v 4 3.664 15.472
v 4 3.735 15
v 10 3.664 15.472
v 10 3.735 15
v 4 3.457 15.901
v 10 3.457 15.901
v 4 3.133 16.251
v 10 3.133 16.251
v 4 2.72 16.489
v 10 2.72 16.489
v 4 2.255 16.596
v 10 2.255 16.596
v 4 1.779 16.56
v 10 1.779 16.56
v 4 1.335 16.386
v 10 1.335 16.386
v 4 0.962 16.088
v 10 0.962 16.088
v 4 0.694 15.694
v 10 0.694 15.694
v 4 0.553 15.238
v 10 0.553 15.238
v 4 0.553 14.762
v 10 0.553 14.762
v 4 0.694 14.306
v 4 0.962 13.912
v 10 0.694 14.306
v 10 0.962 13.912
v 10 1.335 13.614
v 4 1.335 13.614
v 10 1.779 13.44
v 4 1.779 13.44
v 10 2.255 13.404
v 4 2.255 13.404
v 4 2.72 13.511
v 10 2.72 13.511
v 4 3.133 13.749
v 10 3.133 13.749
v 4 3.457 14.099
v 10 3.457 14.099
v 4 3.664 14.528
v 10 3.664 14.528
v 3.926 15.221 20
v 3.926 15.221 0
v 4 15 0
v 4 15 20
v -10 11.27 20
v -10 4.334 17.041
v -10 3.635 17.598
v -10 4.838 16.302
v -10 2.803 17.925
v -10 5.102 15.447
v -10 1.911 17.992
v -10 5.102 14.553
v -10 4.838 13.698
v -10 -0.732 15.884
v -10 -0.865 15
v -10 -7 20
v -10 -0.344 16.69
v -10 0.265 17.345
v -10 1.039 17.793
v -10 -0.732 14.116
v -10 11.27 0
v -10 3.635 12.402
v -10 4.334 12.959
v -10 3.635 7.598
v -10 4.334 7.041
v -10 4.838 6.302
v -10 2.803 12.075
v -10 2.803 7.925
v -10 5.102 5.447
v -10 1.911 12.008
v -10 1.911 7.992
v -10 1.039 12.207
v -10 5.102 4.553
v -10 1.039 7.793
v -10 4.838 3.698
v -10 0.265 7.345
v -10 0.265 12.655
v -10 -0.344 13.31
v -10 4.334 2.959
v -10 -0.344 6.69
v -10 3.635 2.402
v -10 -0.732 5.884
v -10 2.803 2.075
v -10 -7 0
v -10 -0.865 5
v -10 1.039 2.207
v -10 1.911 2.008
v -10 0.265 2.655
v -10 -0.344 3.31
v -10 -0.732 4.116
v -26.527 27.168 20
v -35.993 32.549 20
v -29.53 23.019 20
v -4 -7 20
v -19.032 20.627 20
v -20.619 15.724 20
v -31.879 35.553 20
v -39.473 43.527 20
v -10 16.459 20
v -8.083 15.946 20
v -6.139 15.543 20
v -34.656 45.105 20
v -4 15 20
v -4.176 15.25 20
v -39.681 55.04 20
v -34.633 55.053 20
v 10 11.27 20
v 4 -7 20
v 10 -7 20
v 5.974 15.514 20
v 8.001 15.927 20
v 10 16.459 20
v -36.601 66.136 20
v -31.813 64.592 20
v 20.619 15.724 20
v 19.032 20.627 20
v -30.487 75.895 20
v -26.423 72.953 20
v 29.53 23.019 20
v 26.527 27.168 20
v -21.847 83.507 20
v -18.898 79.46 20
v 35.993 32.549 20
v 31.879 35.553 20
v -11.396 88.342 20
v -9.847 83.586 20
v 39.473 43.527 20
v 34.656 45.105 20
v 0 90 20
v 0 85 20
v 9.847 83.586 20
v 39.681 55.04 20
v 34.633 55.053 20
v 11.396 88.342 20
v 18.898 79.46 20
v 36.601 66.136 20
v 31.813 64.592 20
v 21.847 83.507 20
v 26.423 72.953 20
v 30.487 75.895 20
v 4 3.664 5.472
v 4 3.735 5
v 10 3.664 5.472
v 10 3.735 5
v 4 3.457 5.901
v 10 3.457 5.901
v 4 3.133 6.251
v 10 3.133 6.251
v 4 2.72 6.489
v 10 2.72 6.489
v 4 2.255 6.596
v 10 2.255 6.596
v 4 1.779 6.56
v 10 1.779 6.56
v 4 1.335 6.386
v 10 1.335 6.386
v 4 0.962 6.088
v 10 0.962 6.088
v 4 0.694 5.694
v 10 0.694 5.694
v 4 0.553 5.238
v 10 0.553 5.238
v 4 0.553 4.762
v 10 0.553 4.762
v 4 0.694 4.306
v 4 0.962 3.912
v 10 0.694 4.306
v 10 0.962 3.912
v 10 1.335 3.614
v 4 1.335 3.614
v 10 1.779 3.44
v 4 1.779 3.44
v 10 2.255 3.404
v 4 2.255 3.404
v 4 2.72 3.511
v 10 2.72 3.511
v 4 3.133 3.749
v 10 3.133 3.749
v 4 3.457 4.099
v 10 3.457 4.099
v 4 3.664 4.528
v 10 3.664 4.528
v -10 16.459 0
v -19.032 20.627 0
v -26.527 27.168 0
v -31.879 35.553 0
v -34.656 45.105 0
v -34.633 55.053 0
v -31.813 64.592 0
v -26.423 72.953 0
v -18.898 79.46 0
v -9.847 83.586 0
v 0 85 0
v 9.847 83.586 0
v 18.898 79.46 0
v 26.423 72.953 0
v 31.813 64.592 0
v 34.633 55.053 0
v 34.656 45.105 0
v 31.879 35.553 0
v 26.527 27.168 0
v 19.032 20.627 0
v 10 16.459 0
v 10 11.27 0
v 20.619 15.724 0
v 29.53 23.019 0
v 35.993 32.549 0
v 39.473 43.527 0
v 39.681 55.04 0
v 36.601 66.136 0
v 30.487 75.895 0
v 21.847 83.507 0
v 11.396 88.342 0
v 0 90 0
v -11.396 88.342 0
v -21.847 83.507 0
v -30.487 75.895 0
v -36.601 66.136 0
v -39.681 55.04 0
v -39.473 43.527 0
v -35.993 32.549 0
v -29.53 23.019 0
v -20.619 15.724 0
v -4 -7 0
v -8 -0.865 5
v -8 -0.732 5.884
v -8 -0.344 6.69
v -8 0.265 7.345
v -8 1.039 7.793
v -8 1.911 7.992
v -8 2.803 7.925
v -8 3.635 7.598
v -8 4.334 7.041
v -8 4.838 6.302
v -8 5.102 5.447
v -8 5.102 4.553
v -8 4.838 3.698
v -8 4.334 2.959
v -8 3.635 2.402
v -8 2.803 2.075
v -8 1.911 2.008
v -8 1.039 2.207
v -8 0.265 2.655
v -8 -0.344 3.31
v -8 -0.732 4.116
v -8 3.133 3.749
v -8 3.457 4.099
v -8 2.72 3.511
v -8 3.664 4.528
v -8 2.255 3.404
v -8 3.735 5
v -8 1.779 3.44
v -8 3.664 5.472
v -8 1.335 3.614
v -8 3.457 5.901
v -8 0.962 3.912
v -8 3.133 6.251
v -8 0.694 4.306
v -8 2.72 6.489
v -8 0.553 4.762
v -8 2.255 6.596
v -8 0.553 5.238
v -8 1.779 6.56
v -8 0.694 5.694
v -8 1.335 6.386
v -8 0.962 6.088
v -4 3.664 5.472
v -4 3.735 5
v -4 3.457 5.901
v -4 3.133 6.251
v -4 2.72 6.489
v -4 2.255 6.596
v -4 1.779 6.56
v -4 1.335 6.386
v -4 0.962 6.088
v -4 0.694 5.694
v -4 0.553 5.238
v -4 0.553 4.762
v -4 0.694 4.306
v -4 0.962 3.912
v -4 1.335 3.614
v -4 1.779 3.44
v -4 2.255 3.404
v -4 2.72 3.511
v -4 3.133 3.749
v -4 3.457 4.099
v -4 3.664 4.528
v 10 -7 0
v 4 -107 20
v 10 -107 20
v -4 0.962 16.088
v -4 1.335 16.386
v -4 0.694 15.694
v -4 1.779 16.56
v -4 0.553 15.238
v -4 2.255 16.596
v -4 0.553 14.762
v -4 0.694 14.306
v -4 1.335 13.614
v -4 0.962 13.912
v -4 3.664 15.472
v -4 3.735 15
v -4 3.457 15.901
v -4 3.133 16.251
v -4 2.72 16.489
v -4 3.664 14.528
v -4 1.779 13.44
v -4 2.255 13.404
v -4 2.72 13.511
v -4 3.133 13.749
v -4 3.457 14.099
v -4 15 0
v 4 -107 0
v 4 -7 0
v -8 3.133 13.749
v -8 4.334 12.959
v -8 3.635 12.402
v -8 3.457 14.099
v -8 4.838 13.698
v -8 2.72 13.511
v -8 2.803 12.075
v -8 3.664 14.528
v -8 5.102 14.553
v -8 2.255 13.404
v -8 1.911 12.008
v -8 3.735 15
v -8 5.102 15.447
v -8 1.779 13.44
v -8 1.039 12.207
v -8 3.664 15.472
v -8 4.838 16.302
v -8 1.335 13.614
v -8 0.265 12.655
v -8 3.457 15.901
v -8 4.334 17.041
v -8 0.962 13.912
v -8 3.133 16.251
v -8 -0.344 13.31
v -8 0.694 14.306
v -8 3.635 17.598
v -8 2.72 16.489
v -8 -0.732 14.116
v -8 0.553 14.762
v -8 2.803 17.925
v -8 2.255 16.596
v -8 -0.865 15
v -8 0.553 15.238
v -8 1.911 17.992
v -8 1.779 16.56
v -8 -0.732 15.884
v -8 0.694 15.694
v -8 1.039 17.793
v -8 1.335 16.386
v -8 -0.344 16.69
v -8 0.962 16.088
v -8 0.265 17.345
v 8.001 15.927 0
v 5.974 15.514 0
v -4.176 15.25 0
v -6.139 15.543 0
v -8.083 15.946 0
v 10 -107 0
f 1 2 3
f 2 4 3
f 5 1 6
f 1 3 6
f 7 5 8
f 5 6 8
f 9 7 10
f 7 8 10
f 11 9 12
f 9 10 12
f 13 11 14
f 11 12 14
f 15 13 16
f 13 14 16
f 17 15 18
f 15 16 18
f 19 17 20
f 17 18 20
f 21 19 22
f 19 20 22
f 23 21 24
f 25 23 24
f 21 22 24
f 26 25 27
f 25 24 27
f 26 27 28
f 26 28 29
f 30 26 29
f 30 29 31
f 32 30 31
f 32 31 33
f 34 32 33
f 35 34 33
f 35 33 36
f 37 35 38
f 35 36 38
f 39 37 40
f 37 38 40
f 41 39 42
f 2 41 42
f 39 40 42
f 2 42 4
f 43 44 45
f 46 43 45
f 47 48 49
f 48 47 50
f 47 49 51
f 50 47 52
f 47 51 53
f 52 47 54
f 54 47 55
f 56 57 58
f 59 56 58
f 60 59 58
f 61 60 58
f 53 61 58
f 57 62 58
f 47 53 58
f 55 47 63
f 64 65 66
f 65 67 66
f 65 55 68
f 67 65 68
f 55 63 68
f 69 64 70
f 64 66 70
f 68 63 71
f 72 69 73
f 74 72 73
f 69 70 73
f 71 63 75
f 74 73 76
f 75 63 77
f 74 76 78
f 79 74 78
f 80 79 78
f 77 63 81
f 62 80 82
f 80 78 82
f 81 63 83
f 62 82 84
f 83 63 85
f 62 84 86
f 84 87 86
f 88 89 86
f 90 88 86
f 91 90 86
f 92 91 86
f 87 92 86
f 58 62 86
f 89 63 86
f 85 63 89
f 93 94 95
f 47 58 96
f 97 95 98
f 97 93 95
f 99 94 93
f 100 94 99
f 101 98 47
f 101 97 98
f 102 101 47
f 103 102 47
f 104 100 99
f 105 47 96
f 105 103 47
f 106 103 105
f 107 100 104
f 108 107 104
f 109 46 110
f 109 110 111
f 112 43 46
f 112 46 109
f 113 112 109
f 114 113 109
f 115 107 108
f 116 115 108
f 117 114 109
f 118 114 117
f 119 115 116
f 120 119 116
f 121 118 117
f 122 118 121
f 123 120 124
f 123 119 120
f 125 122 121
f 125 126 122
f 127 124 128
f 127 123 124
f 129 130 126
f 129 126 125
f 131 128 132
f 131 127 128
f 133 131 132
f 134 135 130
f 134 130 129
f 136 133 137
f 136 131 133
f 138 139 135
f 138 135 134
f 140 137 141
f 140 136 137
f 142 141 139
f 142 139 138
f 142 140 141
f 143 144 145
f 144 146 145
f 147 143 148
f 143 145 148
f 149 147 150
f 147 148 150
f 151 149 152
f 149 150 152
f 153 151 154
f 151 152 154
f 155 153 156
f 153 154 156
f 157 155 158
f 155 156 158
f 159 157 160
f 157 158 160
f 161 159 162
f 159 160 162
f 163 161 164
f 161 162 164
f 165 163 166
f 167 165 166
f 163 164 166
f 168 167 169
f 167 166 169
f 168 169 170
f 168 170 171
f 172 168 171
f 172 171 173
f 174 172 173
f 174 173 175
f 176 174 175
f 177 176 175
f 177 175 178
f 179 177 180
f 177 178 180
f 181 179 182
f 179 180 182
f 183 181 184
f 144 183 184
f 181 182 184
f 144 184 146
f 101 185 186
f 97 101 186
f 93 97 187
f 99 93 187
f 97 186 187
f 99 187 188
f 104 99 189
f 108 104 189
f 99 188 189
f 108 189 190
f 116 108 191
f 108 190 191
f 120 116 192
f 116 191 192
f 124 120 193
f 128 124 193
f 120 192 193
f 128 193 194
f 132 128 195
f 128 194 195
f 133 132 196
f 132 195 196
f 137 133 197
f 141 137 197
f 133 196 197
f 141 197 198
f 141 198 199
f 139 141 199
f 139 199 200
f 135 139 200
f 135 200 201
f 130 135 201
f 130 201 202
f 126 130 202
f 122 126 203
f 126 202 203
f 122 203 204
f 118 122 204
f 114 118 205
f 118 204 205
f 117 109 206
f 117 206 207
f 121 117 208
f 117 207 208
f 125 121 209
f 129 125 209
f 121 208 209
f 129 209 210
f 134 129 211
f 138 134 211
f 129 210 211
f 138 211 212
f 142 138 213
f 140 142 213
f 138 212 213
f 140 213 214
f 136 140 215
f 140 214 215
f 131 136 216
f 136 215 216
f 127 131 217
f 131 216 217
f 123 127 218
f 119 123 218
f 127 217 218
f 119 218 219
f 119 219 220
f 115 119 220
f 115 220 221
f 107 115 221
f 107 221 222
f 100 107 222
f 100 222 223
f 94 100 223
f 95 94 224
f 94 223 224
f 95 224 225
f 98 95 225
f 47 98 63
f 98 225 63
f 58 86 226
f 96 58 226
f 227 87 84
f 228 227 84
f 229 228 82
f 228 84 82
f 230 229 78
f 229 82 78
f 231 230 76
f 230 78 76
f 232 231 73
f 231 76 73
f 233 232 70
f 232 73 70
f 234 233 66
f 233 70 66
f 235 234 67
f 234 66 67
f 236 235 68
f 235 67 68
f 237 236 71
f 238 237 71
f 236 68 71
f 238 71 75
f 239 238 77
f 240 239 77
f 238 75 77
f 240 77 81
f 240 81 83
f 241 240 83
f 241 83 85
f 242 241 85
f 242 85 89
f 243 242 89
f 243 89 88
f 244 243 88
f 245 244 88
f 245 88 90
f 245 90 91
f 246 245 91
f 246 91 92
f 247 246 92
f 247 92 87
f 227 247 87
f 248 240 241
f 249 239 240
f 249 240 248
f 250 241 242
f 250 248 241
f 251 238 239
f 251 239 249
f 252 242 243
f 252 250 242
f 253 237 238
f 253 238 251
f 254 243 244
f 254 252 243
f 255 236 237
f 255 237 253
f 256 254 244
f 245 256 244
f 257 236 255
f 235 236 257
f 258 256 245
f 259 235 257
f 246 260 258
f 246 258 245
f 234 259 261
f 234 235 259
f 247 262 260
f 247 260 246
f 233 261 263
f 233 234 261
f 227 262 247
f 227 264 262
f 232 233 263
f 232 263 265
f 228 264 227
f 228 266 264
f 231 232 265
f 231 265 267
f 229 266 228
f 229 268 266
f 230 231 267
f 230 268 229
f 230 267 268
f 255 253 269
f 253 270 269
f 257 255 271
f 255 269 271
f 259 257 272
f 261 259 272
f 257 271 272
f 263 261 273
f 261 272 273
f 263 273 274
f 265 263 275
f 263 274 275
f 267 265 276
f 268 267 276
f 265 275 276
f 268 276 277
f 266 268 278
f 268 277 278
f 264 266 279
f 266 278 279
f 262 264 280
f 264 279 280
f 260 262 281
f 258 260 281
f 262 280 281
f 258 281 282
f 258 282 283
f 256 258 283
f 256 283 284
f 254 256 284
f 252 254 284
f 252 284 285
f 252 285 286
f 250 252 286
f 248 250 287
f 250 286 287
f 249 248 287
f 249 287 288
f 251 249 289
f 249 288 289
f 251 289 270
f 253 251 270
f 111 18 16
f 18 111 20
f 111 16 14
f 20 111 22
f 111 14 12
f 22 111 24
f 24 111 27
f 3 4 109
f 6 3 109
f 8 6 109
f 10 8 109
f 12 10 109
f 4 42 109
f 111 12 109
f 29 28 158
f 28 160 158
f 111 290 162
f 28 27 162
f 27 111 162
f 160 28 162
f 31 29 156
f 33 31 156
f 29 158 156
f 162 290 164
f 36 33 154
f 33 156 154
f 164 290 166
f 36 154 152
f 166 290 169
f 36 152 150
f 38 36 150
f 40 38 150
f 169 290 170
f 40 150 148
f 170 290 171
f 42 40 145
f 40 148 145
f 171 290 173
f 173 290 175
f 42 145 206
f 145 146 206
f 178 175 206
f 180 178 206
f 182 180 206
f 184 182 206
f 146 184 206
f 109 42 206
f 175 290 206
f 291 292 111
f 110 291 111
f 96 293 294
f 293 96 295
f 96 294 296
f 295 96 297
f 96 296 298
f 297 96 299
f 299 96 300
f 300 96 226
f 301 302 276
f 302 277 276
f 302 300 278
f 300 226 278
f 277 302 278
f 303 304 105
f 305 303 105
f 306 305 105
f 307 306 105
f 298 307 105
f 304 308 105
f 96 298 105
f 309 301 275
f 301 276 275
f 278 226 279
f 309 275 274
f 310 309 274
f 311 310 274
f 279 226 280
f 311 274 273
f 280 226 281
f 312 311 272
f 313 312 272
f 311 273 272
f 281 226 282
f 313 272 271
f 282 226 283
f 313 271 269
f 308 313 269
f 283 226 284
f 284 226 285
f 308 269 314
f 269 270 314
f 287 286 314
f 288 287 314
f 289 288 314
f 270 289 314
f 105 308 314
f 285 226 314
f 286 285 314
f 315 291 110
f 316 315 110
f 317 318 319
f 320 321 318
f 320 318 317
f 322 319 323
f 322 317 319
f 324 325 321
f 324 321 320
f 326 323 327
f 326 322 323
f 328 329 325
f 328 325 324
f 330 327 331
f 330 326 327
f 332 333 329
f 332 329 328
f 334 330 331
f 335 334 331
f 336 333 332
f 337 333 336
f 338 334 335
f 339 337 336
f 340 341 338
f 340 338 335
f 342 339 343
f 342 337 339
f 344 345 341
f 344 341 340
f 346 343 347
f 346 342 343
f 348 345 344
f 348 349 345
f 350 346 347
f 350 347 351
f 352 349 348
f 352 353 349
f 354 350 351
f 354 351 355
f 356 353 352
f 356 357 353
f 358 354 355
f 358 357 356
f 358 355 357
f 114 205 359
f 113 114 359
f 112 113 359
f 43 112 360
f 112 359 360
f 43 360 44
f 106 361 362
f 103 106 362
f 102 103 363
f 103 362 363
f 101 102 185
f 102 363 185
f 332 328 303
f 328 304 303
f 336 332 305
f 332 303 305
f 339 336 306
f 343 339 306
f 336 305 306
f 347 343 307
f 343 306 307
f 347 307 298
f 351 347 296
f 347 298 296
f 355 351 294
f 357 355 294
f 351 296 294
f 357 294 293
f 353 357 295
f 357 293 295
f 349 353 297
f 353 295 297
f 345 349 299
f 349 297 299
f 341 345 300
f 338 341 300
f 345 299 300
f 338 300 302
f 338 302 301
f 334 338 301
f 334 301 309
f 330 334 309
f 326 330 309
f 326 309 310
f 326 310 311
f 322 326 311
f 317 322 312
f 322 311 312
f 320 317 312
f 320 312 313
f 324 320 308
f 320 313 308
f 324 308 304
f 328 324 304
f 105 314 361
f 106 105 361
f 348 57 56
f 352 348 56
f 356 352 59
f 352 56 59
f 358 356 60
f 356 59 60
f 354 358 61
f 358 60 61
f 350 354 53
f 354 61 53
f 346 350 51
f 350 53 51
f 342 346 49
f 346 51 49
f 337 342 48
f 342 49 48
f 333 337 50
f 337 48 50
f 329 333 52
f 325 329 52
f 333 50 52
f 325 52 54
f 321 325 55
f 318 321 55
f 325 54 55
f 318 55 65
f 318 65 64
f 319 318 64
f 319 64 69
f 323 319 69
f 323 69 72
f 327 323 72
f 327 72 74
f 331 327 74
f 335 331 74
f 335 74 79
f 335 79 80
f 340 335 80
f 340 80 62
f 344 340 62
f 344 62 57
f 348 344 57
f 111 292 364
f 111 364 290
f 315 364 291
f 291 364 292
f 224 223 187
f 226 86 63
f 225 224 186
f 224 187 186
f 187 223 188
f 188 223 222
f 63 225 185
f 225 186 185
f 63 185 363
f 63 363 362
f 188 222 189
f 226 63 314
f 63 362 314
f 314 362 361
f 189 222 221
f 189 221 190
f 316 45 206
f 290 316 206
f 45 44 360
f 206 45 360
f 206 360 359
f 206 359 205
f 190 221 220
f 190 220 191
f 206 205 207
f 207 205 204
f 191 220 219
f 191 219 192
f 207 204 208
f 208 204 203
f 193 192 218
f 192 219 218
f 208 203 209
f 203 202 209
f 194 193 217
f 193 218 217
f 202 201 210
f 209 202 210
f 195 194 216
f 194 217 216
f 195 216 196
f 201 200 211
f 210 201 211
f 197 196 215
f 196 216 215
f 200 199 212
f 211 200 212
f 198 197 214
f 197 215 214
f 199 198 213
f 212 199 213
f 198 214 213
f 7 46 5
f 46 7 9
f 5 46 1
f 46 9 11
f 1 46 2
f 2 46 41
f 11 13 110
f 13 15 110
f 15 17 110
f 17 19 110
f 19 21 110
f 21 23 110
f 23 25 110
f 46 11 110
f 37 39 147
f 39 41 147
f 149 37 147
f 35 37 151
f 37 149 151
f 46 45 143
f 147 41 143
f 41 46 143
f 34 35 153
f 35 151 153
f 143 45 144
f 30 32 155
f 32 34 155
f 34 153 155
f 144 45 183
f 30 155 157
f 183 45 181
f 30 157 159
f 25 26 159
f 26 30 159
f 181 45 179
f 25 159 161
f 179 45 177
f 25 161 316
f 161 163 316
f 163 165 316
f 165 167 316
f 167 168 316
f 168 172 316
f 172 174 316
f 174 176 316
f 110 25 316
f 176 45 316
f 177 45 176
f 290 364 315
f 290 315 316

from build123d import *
from build123d import SkipClean  # not in build123d's __all__

# Parameters (mm, degrees)
F1_DEPTH       = 20
F3_D           = 3.2
F3_CBORE_D     = 6
F3_CBORE_DEPTH = 2
F4_W           = 100
F4_H           = 20
F5_DEPTH       = 6


with BuildPart() as f1:
    # F0 (on Top) → F1 (new body)
    with BuildSketch(Plane.XY):
        with BuildLine():
            ThreePointArc((-10, 16.4589803375), (0, 85), (10, 16.4589803375))
            Line((10, 16.4589803375), (10, 11.2701665379))
            ThreePointArc((10, 11.2701665379), (0, 90), (-10, 11.2701665379))
            Line((-10, 11.2701665379), (-10, 16.4589803375))
        make_face()
        with BuildLine():
            ThreePointArc((-4.1759576062, 15.2500161429), (-7.1137080428, 15.7305506627), (-10, 16.4589803375))
            Line((-10, 16.4589803375), (-10, 11.2701665379))
            Line((-10, 11.2701665379), (-10, -7.0000002161))
            Line((-10, -7.0000002161), (-4.00000019, -7.0000002161))
            Line((-4.00000019, -7.0000002161), (-4.00000019, 15))
            Line((-4.00000019, 15), (-4.1759576062, 15.2500161429))
        make_face()
        with BuildLine():
            Line((10, 11.2701665379), (10, 16.4589803375))
            ThreePointArc((10, 16.4589803375), (6.990271983, 15.7051593151), (3.925610649, 15.2208455964))
            Line((3.925610649, 15.2208455964), (4.00000019, 15))
            Line((4.00000019, 15), (4.00000019, -7.0000002161))
            Line((4.00000019, -7.0000002161), (10, -7.0000002161))
            Line((10, -7.0000002161), (10, 11.2701665379))
        make_face()
    extrude(amount=F1_DEPTH)

    # F3 (through all)
    with Locations(Plane(origin=(-10, 0, 0), x_dir=(0, -1, 0), z_dir=(-1, 0, 0))):
        with Locations((-2.1350831609, 5), (-2.1350831609, 15)):
            CounterBoreHole(F3_D / 2, F3_CBORE_D / 2, F3_CBORE_DEPTH)

    # F4 (on face) → F5 (join)
    with BuildSketch(Plane.YZ.offset(10)):
        with Locations((-57.0000002161, 10)):
            Rectangle(F4_W, F4_H)
    with SkipClean():  # cleaning this boolean's faces spoils the solid; the shape is the same uncleaned
        extrude(amount=-F5_DEPTH)


solid = f1.part
